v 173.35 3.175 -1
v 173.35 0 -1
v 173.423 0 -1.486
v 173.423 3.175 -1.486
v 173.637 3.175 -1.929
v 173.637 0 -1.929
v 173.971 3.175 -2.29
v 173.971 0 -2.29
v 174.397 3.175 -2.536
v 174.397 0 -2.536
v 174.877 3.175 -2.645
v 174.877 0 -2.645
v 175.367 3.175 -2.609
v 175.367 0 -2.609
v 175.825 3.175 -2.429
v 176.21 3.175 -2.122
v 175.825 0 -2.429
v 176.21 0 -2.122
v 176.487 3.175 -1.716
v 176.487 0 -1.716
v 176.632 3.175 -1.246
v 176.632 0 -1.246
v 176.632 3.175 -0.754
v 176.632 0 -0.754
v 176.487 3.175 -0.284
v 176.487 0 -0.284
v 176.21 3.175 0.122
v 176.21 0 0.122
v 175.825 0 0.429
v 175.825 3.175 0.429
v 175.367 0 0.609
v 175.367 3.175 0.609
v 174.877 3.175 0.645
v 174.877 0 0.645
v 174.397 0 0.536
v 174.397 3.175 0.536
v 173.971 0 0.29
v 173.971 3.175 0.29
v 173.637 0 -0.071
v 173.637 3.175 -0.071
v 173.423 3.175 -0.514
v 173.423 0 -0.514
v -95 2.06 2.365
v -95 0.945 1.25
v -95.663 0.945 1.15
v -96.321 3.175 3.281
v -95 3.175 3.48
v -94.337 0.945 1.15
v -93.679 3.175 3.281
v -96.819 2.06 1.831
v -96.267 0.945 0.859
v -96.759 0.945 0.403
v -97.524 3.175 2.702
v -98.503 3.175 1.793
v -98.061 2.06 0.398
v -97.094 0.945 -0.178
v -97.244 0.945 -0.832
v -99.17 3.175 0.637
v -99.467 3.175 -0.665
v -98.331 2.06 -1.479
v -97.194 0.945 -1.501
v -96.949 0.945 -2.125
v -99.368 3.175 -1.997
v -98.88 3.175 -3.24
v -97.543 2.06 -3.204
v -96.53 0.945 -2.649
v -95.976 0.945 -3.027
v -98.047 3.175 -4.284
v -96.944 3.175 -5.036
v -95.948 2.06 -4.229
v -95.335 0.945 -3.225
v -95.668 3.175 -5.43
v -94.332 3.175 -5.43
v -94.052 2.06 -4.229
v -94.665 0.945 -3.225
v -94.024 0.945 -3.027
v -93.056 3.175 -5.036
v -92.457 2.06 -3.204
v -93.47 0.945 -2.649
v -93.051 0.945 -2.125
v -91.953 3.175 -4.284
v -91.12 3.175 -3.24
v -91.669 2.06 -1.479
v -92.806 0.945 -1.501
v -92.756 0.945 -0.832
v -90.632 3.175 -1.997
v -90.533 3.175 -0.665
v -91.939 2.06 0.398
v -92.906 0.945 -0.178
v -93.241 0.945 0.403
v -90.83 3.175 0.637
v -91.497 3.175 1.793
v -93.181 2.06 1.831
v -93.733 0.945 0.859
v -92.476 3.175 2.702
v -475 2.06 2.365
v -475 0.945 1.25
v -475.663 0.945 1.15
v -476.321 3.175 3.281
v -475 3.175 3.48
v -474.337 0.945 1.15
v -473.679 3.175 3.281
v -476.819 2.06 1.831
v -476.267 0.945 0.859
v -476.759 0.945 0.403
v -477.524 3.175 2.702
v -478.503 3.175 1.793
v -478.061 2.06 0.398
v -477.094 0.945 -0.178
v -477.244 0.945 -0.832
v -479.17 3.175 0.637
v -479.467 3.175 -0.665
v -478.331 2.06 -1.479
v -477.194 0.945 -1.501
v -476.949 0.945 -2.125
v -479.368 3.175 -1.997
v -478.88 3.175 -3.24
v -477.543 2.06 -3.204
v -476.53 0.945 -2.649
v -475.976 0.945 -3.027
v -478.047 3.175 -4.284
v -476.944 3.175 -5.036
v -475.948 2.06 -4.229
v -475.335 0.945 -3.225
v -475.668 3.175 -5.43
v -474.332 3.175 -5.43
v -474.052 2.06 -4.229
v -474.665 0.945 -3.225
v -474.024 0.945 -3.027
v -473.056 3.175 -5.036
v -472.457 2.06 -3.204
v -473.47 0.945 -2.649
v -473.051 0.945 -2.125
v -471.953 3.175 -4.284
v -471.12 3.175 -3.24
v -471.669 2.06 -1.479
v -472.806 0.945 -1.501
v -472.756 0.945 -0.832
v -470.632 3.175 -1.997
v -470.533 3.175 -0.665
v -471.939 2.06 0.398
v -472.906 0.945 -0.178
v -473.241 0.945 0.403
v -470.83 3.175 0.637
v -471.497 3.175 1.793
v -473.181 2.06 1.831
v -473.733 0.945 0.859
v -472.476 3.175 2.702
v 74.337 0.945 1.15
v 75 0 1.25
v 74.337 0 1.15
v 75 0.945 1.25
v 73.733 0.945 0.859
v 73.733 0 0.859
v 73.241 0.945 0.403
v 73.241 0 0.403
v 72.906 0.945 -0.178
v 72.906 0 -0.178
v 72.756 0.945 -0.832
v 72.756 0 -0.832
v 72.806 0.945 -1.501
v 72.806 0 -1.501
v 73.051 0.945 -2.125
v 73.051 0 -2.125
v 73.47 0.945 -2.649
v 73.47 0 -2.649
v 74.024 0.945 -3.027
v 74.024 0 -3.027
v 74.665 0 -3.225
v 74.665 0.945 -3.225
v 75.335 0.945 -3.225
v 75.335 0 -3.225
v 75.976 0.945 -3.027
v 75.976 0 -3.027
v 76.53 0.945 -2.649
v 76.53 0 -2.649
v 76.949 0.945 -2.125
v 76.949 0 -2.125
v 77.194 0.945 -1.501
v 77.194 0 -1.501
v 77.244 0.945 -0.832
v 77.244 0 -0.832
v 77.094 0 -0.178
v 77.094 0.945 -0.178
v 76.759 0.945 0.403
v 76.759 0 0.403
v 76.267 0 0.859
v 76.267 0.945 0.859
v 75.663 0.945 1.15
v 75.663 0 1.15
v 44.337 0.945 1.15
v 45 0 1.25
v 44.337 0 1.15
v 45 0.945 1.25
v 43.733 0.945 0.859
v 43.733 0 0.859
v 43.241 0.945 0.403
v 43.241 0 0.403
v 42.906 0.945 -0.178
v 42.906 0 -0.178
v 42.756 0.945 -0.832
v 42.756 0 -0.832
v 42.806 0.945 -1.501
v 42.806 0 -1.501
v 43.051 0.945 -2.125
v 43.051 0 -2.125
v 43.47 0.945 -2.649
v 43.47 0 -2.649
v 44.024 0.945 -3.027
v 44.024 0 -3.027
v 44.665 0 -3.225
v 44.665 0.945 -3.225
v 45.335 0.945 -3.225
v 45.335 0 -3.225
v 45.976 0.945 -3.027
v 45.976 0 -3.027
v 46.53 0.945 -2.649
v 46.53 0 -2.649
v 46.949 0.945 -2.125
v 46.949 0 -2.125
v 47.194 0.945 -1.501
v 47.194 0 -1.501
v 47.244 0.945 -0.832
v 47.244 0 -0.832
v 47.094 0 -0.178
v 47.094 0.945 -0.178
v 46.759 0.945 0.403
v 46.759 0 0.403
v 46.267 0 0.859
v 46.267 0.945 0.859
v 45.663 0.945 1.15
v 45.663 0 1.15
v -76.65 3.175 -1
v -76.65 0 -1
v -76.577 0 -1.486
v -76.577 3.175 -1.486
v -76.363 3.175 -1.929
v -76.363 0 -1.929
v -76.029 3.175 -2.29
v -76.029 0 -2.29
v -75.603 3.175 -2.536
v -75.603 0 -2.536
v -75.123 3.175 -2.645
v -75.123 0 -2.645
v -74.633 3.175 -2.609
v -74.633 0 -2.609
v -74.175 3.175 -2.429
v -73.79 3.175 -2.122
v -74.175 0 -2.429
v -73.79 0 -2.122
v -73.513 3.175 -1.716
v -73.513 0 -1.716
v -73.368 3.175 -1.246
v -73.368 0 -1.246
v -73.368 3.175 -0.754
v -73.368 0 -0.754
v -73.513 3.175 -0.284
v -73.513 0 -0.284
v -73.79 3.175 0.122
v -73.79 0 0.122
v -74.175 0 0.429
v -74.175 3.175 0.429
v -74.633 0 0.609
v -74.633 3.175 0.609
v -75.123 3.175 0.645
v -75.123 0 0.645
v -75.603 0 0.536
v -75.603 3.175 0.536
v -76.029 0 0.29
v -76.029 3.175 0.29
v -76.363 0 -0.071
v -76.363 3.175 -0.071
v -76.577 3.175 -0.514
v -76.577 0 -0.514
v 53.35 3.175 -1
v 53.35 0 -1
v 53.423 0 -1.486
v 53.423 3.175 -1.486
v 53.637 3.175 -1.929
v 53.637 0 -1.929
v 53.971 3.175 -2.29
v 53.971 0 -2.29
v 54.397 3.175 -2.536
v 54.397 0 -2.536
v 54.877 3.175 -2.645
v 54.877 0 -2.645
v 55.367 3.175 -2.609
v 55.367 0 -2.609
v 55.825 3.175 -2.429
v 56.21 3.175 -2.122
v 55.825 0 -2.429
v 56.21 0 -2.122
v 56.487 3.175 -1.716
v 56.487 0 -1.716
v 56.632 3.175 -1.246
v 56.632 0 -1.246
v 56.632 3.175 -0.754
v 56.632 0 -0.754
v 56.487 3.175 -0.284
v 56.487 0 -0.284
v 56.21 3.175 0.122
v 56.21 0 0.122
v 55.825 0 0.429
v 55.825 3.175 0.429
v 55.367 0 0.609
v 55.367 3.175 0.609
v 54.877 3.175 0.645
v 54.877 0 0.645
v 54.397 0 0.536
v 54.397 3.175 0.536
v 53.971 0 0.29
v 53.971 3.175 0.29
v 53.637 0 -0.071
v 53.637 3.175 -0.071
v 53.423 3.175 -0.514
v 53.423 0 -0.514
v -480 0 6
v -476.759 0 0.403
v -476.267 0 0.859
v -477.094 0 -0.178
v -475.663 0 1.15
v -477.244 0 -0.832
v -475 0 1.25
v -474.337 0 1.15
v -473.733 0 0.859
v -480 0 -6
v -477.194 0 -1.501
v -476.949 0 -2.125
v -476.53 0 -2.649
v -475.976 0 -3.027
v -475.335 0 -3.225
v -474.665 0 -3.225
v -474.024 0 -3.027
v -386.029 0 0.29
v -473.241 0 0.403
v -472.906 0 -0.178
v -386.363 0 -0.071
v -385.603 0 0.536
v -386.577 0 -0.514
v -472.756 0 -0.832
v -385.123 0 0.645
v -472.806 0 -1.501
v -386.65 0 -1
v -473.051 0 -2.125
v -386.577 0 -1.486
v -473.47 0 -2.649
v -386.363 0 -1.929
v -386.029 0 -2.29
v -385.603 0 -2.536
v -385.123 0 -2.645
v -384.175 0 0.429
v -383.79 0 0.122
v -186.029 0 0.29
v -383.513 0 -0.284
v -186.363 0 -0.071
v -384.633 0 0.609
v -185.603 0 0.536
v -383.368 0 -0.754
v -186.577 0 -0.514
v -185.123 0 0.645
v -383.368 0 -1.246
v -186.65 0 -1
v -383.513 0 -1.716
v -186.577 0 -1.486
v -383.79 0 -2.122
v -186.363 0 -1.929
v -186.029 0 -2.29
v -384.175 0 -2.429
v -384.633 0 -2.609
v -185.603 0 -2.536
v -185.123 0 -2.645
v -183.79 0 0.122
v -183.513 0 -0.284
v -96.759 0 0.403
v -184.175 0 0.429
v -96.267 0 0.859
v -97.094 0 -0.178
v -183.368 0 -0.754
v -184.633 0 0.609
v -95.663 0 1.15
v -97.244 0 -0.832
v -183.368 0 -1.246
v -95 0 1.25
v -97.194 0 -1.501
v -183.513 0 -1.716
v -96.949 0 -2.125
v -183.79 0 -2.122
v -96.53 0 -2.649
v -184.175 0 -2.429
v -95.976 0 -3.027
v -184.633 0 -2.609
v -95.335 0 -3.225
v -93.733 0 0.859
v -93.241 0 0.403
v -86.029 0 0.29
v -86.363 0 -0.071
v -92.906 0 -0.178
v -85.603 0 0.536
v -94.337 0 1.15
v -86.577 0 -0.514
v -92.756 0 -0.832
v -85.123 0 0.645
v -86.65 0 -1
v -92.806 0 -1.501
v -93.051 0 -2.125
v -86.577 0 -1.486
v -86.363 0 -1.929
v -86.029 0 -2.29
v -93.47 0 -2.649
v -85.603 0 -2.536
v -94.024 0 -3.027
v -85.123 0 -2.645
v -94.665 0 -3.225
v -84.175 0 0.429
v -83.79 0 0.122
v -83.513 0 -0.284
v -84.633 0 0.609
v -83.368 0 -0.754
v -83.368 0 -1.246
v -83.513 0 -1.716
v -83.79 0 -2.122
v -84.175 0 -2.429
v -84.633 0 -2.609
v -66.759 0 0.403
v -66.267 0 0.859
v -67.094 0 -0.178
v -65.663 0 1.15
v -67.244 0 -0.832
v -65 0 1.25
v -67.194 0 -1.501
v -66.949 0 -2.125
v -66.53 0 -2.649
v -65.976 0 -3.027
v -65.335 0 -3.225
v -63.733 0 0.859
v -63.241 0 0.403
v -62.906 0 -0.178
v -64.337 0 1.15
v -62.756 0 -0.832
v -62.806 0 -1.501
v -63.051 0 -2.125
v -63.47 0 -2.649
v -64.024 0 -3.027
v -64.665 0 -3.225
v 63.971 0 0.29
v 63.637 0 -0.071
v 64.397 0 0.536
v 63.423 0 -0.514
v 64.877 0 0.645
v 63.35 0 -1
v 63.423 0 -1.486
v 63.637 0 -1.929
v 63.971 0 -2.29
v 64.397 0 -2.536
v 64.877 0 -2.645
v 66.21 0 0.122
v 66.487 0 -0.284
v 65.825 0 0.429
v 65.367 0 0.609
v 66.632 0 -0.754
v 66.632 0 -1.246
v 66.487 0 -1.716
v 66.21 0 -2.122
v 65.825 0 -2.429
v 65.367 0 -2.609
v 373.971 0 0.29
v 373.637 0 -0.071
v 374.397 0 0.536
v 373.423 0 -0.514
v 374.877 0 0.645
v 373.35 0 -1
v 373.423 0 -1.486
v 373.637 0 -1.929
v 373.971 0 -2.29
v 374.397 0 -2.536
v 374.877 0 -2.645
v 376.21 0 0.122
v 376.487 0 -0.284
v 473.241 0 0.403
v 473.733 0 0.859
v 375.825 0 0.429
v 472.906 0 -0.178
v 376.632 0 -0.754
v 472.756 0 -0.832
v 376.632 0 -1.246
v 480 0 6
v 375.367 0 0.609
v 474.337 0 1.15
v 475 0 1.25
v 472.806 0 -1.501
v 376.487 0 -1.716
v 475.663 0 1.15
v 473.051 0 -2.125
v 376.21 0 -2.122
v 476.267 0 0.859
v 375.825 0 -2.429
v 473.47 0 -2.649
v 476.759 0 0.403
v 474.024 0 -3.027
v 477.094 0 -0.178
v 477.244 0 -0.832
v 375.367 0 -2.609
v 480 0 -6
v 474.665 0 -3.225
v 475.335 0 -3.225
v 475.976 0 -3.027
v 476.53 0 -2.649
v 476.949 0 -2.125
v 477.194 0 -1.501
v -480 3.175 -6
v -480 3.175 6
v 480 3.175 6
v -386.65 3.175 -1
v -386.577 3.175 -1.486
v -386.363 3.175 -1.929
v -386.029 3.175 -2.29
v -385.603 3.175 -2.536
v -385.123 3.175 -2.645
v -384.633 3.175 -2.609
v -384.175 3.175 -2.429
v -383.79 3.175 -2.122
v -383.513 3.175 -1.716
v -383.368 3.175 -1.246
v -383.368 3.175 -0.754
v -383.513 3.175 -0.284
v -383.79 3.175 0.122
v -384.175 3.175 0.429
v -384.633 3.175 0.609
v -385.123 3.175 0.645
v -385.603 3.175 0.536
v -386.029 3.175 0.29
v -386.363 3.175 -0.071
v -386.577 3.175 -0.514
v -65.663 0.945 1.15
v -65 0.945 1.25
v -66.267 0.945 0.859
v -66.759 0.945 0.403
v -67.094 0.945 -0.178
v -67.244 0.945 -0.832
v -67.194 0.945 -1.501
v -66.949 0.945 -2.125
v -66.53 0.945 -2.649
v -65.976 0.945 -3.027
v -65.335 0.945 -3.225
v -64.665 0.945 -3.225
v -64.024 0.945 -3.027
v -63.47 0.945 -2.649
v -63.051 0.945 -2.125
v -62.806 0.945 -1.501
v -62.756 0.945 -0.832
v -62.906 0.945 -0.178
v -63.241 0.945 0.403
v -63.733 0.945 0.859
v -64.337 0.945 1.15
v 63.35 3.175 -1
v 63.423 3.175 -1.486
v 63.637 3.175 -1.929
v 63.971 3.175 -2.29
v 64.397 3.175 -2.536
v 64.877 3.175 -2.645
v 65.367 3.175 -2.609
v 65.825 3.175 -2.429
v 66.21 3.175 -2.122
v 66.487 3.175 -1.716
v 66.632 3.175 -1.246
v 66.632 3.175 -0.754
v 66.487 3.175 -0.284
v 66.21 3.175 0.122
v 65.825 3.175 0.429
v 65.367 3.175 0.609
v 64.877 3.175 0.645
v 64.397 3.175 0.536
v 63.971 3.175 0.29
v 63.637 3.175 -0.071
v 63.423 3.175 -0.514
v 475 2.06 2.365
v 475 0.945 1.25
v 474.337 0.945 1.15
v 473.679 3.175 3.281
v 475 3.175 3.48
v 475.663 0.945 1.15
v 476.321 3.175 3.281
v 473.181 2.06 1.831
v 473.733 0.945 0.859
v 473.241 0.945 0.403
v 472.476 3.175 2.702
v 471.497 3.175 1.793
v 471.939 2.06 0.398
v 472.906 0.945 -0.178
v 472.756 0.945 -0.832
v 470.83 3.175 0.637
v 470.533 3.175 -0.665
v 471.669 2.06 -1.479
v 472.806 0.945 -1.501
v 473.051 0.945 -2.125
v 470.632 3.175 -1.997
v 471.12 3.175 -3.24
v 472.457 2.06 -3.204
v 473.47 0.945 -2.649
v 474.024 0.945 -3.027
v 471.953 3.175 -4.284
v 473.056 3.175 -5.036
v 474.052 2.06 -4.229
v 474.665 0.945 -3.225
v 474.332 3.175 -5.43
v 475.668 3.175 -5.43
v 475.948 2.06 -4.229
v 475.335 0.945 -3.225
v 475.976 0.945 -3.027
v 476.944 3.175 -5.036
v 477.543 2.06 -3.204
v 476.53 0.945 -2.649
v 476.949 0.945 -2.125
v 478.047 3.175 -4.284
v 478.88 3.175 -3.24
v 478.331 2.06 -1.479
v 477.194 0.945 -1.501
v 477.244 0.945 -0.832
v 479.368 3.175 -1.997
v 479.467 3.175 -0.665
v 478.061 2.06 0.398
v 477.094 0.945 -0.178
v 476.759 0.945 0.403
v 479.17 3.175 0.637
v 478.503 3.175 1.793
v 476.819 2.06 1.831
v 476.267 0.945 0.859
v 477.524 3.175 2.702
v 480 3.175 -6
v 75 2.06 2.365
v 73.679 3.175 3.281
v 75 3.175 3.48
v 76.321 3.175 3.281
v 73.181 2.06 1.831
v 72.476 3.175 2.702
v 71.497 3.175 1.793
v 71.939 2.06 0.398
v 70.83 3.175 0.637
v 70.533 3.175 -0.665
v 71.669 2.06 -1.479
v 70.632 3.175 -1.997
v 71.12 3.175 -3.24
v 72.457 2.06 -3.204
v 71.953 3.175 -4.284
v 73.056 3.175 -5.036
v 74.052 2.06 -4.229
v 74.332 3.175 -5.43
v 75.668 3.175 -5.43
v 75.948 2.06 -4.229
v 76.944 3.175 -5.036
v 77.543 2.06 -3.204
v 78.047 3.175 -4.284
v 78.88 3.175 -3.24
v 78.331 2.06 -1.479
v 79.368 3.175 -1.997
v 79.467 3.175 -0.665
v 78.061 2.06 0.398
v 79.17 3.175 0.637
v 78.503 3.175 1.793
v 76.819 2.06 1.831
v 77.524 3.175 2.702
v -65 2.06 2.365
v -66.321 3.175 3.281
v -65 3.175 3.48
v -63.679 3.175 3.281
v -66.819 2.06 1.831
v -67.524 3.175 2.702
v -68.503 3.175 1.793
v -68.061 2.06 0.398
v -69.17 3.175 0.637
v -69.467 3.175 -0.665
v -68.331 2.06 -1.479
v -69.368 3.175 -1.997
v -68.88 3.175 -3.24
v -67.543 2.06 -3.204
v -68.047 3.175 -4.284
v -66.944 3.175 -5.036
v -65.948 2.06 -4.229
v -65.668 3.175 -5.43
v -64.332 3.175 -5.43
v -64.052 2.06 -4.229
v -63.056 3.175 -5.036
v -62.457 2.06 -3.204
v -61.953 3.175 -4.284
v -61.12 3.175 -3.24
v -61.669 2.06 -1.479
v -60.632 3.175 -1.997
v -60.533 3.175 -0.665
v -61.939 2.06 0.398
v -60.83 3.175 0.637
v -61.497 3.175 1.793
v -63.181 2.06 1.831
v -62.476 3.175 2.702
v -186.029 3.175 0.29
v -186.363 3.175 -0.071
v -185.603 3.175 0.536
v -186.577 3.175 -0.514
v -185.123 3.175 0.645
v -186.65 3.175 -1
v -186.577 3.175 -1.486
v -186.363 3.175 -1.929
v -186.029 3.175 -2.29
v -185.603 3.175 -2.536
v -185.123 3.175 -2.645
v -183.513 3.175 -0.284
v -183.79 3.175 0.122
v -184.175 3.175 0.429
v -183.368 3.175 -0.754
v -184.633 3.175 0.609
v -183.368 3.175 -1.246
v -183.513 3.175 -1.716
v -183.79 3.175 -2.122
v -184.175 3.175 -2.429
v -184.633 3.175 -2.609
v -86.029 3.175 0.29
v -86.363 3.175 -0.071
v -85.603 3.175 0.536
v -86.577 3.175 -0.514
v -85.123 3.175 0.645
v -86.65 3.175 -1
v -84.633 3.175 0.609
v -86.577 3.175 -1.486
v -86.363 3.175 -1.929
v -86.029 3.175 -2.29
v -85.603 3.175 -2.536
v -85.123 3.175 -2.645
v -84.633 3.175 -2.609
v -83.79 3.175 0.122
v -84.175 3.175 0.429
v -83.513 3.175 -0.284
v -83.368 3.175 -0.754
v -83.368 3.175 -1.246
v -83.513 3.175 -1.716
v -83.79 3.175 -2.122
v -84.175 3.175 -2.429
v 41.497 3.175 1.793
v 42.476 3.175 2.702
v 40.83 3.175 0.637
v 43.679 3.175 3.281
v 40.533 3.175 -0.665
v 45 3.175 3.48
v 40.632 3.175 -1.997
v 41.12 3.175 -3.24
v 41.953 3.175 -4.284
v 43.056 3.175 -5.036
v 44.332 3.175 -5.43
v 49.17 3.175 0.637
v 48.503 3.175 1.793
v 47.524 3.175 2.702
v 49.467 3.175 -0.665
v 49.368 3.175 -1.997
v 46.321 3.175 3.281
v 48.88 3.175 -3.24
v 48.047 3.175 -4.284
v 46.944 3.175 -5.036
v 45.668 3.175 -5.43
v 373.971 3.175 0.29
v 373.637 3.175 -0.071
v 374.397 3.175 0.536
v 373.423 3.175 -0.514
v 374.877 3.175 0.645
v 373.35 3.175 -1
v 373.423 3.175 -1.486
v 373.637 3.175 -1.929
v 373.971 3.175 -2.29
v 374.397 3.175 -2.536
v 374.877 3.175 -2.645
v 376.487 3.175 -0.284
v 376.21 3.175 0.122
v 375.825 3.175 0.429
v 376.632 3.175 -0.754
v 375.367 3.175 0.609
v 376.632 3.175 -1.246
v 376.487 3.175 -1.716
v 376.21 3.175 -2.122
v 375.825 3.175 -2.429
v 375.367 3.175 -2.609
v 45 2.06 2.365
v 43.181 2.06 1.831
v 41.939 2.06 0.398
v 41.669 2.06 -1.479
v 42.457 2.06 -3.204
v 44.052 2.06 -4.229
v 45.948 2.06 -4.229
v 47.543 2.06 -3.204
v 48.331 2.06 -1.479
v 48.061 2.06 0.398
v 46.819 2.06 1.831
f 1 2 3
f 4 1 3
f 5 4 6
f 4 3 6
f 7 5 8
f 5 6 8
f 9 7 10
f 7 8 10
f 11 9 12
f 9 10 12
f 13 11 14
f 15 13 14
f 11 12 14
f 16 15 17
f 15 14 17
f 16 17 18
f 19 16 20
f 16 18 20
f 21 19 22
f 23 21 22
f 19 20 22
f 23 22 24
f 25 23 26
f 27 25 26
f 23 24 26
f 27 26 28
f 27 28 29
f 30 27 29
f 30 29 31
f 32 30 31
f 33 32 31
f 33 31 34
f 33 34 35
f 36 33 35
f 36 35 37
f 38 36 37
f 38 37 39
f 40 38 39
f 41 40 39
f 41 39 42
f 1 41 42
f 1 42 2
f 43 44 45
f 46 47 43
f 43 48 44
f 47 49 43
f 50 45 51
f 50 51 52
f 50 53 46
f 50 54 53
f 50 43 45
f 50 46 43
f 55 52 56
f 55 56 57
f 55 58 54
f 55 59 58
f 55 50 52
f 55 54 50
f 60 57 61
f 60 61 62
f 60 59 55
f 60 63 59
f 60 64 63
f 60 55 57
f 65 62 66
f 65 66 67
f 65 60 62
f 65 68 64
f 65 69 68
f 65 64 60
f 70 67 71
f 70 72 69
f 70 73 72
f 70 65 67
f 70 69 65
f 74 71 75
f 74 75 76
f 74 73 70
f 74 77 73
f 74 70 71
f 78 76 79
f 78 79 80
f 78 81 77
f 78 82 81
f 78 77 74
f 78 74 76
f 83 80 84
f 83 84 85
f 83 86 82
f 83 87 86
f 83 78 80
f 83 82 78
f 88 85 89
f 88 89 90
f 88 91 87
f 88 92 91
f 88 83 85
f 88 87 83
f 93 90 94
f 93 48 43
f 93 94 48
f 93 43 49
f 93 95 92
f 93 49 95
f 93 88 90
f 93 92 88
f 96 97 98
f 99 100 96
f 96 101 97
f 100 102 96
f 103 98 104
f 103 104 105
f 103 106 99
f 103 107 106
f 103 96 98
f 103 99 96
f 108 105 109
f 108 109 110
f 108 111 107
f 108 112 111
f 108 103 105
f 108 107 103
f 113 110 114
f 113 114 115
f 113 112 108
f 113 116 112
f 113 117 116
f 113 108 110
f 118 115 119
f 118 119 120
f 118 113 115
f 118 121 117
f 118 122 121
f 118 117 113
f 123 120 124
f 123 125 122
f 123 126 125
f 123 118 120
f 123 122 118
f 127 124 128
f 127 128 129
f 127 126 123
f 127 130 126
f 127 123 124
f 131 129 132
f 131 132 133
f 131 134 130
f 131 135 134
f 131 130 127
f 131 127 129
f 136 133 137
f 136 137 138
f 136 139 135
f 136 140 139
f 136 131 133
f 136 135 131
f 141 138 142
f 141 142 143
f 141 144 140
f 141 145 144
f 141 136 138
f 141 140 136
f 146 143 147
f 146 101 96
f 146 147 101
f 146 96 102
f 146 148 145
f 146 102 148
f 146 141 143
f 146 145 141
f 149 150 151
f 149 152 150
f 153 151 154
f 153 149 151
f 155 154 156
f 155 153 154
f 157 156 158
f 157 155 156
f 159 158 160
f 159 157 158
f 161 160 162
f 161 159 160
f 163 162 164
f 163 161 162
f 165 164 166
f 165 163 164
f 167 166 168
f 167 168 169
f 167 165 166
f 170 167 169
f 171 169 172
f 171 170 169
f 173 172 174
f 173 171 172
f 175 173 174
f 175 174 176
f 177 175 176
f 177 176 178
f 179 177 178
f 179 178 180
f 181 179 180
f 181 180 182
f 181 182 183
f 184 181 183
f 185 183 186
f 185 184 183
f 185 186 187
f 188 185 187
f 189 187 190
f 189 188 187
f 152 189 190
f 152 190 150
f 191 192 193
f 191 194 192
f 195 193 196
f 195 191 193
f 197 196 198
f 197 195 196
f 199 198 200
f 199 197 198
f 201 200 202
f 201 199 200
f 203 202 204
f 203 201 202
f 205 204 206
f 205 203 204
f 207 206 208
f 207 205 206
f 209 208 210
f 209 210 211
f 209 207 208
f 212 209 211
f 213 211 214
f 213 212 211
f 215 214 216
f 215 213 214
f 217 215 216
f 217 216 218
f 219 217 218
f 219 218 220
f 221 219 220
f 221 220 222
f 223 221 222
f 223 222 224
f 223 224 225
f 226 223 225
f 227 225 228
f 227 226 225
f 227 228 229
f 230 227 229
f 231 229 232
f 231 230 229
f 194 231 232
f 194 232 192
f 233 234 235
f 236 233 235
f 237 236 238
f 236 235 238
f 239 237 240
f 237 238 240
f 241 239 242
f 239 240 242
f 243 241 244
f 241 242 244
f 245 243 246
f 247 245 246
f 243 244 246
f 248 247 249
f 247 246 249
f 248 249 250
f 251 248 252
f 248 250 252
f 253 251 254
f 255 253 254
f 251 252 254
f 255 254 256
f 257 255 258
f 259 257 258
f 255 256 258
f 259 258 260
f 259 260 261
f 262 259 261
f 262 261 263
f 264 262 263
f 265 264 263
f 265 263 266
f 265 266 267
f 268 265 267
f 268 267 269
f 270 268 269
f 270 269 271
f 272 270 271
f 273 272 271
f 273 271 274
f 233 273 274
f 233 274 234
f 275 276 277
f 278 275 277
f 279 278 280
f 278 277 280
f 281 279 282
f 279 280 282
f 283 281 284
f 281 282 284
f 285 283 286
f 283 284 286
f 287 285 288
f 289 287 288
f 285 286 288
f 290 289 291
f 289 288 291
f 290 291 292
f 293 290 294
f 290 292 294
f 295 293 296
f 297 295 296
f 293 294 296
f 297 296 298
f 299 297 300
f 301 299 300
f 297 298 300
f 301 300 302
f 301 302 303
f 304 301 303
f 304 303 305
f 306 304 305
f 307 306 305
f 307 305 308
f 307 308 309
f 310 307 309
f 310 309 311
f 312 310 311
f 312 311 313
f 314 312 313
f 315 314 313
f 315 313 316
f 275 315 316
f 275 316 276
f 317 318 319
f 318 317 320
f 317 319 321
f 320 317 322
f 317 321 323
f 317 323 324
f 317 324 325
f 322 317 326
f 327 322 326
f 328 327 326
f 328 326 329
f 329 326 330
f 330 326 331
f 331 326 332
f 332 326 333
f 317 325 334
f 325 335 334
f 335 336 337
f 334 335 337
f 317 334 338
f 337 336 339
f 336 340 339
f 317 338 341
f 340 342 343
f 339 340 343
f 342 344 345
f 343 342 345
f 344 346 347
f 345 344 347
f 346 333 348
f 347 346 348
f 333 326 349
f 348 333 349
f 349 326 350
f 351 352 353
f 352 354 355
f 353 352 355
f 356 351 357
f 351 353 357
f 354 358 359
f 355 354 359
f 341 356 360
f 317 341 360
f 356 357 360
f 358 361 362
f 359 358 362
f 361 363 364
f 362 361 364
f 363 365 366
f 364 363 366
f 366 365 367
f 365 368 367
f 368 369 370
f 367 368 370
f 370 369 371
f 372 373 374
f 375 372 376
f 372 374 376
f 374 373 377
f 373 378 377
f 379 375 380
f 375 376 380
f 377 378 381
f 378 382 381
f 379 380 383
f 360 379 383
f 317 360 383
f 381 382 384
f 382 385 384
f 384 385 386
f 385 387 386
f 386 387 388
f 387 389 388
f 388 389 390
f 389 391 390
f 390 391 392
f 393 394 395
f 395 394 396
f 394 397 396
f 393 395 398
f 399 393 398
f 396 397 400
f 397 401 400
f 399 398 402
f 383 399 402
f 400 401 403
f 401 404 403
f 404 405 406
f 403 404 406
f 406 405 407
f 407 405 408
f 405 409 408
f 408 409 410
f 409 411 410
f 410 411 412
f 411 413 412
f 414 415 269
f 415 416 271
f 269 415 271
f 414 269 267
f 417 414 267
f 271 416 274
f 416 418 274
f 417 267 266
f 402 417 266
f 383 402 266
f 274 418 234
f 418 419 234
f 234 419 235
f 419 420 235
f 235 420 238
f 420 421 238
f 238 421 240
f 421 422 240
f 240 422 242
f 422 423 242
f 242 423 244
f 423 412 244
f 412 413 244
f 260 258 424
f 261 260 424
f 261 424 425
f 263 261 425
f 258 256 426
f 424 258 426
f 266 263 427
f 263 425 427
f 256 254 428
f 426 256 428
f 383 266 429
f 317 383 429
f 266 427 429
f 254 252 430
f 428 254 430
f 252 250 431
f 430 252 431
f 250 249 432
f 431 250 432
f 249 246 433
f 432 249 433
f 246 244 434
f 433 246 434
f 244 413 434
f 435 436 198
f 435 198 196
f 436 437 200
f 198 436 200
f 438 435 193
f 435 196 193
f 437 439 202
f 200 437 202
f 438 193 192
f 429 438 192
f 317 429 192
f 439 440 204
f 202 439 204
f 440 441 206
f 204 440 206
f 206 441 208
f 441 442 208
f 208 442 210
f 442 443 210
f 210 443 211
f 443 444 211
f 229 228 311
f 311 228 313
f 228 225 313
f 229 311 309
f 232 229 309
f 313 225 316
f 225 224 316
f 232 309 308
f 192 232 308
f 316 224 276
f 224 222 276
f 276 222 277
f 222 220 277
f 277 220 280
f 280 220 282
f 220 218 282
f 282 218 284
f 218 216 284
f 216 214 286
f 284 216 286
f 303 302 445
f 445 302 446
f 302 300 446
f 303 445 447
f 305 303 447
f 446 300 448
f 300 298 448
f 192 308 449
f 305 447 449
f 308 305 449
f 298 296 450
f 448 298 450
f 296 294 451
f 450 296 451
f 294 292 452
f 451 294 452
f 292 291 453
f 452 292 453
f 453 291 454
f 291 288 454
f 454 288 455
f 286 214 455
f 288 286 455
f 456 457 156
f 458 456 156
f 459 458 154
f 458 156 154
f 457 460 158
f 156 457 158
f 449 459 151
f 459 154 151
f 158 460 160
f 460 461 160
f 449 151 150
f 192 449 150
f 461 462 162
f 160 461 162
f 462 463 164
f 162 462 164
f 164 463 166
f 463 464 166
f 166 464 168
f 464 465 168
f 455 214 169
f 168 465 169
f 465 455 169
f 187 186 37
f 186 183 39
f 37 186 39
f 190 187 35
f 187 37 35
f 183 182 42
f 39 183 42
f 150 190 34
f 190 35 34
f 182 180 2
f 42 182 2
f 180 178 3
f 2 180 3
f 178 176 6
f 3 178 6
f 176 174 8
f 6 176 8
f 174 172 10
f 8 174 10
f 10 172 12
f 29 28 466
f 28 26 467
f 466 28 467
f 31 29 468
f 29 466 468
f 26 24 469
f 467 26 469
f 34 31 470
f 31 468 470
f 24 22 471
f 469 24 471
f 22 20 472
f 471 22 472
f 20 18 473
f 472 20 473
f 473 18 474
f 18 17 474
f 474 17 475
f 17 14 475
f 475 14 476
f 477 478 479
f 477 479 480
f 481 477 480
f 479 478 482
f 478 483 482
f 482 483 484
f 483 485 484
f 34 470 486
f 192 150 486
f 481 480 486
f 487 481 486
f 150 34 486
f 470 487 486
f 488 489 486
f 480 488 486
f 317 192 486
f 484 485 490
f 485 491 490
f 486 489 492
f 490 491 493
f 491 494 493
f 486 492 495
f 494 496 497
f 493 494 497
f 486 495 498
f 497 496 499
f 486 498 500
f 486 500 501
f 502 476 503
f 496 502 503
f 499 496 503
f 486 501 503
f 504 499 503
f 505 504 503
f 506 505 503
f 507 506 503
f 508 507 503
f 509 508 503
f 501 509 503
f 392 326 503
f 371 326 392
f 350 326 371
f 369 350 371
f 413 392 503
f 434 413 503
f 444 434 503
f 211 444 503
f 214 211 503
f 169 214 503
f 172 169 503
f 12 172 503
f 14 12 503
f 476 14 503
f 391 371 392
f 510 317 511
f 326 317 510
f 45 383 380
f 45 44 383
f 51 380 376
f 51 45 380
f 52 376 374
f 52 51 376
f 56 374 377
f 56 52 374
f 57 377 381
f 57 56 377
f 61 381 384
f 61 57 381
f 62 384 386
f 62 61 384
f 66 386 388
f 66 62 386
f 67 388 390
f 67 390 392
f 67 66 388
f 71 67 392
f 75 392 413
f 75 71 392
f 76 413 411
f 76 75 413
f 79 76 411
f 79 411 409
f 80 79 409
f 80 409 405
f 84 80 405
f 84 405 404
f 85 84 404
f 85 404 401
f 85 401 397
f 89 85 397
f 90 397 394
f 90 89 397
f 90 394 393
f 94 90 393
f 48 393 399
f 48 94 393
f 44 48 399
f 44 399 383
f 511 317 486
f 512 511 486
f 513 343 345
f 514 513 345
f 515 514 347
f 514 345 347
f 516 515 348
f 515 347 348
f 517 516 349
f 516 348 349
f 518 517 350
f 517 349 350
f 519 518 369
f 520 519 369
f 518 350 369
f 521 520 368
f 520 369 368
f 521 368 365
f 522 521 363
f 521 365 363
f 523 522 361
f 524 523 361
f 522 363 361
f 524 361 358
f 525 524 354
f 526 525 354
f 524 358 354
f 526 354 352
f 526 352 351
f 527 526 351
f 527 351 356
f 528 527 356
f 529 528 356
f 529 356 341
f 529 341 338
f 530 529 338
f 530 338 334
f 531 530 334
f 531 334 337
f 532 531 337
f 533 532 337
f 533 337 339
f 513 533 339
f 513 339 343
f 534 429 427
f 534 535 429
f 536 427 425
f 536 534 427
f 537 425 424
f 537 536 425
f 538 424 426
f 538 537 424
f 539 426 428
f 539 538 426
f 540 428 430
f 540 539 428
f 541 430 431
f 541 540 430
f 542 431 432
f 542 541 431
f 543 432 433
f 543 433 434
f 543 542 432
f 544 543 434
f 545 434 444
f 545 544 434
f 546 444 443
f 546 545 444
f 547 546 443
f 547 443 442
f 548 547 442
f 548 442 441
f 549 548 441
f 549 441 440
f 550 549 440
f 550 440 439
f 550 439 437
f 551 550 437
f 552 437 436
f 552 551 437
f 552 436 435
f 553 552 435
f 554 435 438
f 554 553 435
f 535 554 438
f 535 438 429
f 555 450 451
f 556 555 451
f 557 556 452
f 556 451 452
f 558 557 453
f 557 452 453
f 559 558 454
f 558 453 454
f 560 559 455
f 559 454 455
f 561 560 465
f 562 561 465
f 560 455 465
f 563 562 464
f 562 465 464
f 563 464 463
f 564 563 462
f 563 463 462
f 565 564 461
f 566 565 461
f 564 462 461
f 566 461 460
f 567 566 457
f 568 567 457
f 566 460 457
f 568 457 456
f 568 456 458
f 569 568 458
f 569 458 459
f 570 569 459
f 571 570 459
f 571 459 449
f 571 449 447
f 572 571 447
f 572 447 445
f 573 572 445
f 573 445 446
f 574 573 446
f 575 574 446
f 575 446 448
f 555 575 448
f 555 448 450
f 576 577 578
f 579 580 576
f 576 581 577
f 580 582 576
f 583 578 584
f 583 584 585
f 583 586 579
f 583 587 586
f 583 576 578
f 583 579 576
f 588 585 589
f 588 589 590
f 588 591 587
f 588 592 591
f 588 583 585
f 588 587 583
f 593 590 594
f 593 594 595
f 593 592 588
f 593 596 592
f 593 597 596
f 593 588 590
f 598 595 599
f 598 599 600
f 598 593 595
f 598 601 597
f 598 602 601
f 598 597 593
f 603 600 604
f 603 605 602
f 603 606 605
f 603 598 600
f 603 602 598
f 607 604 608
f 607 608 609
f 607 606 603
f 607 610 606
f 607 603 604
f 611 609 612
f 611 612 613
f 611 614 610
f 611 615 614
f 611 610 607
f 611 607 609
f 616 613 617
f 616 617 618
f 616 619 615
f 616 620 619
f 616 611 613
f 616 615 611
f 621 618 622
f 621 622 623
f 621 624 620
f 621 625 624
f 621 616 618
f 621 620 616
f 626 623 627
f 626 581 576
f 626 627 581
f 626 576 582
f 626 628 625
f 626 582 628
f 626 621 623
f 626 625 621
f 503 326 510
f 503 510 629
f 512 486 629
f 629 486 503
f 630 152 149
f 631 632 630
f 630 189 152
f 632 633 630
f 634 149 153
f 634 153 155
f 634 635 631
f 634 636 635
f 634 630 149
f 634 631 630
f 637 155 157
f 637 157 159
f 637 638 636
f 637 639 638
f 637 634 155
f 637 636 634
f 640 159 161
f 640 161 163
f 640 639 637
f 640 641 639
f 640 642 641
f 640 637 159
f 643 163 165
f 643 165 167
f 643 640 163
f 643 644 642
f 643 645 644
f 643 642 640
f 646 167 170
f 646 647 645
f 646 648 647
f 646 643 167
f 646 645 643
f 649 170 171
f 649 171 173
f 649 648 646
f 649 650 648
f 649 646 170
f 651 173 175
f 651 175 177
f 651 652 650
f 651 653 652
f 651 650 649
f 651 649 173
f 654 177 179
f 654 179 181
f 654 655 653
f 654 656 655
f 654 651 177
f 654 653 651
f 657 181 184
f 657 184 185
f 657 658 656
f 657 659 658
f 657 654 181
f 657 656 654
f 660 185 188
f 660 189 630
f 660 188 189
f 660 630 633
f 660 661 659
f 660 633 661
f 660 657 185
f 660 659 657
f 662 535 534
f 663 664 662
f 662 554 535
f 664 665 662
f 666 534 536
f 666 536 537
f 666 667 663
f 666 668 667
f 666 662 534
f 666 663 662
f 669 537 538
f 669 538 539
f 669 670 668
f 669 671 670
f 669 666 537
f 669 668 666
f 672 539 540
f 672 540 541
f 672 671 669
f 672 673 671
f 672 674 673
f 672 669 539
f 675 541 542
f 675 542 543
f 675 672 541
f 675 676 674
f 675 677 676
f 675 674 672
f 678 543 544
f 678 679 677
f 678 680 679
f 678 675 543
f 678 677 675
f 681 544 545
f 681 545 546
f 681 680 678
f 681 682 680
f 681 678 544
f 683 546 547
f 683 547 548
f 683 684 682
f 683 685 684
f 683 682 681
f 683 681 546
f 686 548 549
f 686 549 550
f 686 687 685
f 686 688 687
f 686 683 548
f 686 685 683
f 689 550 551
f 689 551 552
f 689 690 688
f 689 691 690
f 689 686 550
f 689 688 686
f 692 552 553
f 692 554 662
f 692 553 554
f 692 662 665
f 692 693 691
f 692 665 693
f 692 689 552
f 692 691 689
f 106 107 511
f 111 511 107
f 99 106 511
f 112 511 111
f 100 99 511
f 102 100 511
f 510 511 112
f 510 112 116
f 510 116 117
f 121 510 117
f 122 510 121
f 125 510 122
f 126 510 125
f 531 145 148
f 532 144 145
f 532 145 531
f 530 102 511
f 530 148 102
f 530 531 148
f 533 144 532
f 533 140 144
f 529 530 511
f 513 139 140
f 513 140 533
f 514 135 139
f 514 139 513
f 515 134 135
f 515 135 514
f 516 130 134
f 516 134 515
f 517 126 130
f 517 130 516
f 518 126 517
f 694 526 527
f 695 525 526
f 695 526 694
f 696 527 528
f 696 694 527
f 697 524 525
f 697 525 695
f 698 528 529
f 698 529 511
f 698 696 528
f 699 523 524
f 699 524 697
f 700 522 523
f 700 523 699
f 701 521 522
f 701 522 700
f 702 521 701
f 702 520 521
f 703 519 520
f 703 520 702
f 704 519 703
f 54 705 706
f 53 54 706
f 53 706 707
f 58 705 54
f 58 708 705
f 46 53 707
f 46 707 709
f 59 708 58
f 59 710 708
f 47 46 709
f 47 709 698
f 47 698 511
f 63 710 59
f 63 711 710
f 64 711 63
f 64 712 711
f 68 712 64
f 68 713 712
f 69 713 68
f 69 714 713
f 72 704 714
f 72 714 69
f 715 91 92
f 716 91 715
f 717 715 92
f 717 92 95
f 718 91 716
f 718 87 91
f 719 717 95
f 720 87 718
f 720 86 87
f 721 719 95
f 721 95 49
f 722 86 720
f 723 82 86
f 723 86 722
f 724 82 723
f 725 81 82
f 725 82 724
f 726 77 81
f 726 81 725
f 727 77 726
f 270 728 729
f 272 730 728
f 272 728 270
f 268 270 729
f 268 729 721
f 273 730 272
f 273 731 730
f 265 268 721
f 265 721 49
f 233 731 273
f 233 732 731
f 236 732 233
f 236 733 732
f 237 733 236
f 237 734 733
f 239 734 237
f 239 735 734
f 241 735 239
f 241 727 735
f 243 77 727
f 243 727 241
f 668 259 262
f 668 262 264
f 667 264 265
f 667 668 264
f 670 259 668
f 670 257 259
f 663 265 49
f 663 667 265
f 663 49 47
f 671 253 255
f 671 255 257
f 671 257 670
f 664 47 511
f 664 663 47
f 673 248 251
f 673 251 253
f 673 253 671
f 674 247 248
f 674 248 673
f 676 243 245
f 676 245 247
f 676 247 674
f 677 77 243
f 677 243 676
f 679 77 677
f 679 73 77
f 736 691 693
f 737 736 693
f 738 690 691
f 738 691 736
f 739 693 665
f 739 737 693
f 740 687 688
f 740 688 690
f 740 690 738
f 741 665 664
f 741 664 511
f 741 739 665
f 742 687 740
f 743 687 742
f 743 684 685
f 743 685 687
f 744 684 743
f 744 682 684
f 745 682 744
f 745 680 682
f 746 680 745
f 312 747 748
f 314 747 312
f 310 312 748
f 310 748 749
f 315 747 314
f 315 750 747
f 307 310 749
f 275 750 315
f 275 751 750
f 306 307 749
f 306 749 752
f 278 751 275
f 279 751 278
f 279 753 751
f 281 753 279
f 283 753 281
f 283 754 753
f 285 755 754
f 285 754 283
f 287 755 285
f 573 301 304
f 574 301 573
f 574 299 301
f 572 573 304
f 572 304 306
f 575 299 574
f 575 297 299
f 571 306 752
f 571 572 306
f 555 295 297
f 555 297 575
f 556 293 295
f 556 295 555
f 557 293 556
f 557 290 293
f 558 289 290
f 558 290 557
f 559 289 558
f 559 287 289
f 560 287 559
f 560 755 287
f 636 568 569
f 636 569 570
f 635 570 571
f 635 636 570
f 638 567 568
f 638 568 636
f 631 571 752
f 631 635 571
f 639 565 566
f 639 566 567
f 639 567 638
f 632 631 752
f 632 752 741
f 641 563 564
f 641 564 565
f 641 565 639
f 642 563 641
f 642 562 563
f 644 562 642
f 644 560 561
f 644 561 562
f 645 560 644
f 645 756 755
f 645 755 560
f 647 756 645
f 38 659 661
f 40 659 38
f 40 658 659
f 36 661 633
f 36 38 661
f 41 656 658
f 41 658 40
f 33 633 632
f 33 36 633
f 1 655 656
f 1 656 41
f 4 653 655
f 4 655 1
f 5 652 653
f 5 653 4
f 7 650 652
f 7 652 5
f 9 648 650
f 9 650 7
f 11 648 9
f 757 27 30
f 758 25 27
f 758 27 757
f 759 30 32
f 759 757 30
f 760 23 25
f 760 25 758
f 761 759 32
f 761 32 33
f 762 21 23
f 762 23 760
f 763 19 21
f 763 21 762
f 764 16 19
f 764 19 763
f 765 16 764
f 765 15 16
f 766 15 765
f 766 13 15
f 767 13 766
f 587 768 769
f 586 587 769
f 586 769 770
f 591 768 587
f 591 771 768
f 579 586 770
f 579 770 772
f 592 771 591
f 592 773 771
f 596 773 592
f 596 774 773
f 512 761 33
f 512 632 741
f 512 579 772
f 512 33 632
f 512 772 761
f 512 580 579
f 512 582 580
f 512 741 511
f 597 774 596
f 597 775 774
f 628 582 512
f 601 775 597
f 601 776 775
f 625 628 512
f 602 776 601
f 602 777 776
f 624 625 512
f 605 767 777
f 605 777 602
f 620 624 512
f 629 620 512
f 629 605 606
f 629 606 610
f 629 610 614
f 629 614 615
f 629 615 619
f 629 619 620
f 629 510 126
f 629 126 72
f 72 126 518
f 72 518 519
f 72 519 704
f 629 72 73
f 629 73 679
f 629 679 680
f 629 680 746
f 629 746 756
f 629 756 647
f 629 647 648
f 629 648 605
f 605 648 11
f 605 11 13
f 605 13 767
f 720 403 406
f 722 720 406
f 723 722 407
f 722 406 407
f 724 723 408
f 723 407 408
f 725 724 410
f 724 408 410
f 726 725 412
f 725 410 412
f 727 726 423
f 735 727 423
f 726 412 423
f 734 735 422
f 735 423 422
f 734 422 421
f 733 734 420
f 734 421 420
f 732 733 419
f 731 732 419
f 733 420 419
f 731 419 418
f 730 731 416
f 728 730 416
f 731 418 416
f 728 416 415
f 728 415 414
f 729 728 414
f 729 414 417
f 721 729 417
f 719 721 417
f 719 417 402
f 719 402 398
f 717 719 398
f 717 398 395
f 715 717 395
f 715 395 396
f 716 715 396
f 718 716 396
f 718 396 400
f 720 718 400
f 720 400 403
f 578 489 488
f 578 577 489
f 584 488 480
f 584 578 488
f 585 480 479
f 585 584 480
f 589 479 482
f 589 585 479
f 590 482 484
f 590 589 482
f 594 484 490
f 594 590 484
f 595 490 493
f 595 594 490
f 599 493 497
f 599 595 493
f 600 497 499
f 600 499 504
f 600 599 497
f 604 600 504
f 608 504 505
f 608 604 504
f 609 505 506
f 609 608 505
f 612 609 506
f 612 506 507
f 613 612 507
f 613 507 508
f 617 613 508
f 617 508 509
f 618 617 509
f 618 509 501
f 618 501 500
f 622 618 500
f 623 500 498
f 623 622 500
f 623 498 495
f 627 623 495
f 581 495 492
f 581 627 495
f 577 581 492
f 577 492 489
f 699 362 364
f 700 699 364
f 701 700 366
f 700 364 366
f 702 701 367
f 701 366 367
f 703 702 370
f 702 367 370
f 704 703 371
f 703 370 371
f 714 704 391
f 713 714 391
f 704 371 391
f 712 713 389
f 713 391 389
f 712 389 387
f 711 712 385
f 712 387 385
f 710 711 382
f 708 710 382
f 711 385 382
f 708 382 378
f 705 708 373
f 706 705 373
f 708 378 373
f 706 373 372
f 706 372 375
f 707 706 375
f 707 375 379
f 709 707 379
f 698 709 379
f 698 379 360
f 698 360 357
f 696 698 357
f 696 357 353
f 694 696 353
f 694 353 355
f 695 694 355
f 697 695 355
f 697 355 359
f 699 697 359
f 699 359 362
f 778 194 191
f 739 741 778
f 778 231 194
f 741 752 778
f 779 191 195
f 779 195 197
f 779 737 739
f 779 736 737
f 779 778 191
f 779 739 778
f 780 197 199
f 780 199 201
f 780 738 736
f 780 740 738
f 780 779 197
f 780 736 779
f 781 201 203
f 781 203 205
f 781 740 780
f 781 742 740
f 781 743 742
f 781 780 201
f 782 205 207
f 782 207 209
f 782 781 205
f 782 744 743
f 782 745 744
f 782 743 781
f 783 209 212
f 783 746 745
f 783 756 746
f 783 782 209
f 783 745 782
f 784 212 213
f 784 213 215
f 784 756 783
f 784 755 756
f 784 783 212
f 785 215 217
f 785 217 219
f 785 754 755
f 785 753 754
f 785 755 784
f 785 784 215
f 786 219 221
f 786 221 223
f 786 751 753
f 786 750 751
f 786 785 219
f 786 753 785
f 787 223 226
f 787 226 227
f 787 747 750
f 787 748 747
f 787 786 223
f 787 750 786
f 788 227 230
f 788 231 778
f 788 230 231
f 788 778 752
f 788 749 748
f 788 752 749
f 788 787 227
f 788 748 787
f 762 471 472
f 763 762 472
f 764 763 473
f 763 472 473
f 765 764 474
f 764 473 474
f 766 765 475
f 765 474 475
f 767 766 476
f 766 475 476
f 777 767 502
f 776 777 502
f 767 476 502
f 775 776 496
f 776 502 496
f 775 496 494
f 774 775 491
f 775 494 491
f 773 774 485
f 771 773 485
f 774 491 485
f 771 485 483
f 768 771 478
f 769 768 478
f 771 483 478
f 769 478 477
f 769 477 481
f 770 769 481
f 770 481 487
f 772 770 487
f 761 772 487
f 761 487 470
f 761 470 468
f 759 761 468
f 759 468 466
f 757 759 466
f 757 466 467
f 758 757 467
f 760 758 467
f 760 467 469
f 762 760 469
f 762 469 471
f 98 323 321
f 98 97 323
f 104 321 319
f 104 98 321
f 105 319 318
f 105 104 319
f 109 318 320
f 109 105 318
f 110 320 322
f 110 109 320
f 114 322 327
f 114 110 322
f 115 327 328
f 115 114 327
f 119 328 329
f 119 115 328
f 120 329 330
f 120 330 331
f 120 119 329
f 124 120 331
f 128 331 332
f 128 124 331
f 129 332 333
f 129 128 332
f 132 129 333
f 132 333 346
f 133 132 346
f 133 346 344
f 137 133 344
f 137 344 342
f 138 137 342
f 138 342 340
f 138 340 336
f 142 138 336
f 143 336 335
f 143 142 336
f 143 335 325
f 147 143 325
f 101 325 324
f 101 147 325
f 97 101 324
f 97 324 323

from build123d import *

# Parameters (mm, degrees)
SKETCH1_W                    = 960
SKETCH1_H                    = 12
BOSS_EXTRUDE1_DEPTH          = 3.175
CSK_FOR_M4_SFHCS1_AT_2_COUNT = 2
CSK_FOR_M4_SFHCS1_AT_2_PITCH = 570
CSK_FOR_M4_SFHCS1_AT_3_COUNT = 2
CSK_FOR_M4_SFHCS1_AT_3_PITCH = 540
CSK_FOR_M4_SFHCS1_AT_4_COUNT = 2
CSK_FOR_M4_SFHCS1_AT_4_PITCH = 430
CSK_FOR_M4_SFHCS1_AT_5_COUNT = 2
CSK_FOR_M4_SFHCS1_AT_5_PITCH = 400
CSK_FOR_M4_SFHCS1_AT_6_COUNT = 2
CSK_FOR_M4_SFHCS1_AT_6_PITCH = 950
M4X0_7_TAPPED_HOLE2_D        = 3.3


with BuildPart() as part:
    # Sketch1 → Boss-Extrude1 (new body)
    with BuildSketch(Plane(origin=(0, 0, 0), x_dir=(1, 0, 0), z_dir=(0, 1, 0))):
        Rectangle(SKETCH1_W, SKETCH1_H)
    extrude(amount=BOSS_EXTRUDE1_DEPTH)

    # Sketch3 → CSK for M4 SFHCS1 (revolve, cut)
    with BuildSketch(Plane(origin=(475, 3.175, -1), x_dir=(0, 0, 1), z_dir=(1, 0, 0))):
        Polygon((0, 0), (0, 3.175), (2.25, 3.175), (2.25, 2.23), (4.48, 0), align=None)
    csk_for_m4_sfhcs1 = revolve(axis=Axis((475, 9.525, -1), (0, -1, 0)), mode=Mode.SUBTRACT)

    # CSK for M4 SFHCS1 at 2: CSK for M4 SFHCS1 ×2
    with Locations(*[(-i * CSK_FOR_M4_SFHCS1_AT_2_PITCH, 0, 0) for i in range(1, CSK_FOR_M4_SFHCS1_AT_2_COUNT)]):
        add(csk_for_m4_sfhcs1, mode=Mode.SUBTRACT)

    # CSK for M4 SFHCS1 at 3: CSK for M4 SFHCS1 ×2
    with Locations(*[(-i * CSK_FOR_M4_SFHCS1_AT_3_PITCH, 0, 0) for i in range(1, CSK_FOR_M4_SFHCS1_AT_3_COUNT)]):
        add(csk_for_m4_sfhcs1, mode=Mode.SUBTRACT)

    # CSK for M4 SFHCS1 at 4: CSK for M4 SFHCS1 ×2
    with Locations(*[(-i * CSK_FOR_M4_SFHCS1_AT_4_PITCH, 0, 0) for i in range(1, CSK_FOR_M4_SFHCS1_AT_4_COUNT)]):
        add(csk_for_m4_sfhcs1, mode=Mode.SUBTRACT)

    # CSK for M4 SFHCS1 at 5: CSK for M4 SFHCS1 ×2
    with Locations(*[(-i * CSK_FOR_M4_SFHCS1_AT_5_PITCH, 0, 0) for i in range(1, CSK_FOR_M4_SFHCS1_AT_5_COUNT)]):
        add(csk_for_m4_sfhcs1, mode=Mode.SUBTRACT)

    # CSK for M4 SFHCS1 at 6: CSK for M4 SFHCS1 ×2
    with Locations(*[(-i * CSK_FOR_M4_SFHCS1_AT_6_PITCH, 0, 0) for i in range(1, CSK_FOR_M4_SFHCS1_AT_6_COUNT)]):
        add(csk_for_m4_sfhcs1, mode=Mode.SUBTRACT)

    # M4x0.7 Tapped Hole2 (through all)
    with Locations(Plane(origin=(0, 3.175, 0), x_dir=(1, 0, 0), z_dir=(0, 1, 0))):
        with Locations((-85, 1), (-75, 1), (55, 1), (65, 1), (175, 1), (375, 1), (-385, 1), (-185, 1)):
            Hole(M4X0_7_TAPPED_HOLE2_D / 2)


solid = part.part
